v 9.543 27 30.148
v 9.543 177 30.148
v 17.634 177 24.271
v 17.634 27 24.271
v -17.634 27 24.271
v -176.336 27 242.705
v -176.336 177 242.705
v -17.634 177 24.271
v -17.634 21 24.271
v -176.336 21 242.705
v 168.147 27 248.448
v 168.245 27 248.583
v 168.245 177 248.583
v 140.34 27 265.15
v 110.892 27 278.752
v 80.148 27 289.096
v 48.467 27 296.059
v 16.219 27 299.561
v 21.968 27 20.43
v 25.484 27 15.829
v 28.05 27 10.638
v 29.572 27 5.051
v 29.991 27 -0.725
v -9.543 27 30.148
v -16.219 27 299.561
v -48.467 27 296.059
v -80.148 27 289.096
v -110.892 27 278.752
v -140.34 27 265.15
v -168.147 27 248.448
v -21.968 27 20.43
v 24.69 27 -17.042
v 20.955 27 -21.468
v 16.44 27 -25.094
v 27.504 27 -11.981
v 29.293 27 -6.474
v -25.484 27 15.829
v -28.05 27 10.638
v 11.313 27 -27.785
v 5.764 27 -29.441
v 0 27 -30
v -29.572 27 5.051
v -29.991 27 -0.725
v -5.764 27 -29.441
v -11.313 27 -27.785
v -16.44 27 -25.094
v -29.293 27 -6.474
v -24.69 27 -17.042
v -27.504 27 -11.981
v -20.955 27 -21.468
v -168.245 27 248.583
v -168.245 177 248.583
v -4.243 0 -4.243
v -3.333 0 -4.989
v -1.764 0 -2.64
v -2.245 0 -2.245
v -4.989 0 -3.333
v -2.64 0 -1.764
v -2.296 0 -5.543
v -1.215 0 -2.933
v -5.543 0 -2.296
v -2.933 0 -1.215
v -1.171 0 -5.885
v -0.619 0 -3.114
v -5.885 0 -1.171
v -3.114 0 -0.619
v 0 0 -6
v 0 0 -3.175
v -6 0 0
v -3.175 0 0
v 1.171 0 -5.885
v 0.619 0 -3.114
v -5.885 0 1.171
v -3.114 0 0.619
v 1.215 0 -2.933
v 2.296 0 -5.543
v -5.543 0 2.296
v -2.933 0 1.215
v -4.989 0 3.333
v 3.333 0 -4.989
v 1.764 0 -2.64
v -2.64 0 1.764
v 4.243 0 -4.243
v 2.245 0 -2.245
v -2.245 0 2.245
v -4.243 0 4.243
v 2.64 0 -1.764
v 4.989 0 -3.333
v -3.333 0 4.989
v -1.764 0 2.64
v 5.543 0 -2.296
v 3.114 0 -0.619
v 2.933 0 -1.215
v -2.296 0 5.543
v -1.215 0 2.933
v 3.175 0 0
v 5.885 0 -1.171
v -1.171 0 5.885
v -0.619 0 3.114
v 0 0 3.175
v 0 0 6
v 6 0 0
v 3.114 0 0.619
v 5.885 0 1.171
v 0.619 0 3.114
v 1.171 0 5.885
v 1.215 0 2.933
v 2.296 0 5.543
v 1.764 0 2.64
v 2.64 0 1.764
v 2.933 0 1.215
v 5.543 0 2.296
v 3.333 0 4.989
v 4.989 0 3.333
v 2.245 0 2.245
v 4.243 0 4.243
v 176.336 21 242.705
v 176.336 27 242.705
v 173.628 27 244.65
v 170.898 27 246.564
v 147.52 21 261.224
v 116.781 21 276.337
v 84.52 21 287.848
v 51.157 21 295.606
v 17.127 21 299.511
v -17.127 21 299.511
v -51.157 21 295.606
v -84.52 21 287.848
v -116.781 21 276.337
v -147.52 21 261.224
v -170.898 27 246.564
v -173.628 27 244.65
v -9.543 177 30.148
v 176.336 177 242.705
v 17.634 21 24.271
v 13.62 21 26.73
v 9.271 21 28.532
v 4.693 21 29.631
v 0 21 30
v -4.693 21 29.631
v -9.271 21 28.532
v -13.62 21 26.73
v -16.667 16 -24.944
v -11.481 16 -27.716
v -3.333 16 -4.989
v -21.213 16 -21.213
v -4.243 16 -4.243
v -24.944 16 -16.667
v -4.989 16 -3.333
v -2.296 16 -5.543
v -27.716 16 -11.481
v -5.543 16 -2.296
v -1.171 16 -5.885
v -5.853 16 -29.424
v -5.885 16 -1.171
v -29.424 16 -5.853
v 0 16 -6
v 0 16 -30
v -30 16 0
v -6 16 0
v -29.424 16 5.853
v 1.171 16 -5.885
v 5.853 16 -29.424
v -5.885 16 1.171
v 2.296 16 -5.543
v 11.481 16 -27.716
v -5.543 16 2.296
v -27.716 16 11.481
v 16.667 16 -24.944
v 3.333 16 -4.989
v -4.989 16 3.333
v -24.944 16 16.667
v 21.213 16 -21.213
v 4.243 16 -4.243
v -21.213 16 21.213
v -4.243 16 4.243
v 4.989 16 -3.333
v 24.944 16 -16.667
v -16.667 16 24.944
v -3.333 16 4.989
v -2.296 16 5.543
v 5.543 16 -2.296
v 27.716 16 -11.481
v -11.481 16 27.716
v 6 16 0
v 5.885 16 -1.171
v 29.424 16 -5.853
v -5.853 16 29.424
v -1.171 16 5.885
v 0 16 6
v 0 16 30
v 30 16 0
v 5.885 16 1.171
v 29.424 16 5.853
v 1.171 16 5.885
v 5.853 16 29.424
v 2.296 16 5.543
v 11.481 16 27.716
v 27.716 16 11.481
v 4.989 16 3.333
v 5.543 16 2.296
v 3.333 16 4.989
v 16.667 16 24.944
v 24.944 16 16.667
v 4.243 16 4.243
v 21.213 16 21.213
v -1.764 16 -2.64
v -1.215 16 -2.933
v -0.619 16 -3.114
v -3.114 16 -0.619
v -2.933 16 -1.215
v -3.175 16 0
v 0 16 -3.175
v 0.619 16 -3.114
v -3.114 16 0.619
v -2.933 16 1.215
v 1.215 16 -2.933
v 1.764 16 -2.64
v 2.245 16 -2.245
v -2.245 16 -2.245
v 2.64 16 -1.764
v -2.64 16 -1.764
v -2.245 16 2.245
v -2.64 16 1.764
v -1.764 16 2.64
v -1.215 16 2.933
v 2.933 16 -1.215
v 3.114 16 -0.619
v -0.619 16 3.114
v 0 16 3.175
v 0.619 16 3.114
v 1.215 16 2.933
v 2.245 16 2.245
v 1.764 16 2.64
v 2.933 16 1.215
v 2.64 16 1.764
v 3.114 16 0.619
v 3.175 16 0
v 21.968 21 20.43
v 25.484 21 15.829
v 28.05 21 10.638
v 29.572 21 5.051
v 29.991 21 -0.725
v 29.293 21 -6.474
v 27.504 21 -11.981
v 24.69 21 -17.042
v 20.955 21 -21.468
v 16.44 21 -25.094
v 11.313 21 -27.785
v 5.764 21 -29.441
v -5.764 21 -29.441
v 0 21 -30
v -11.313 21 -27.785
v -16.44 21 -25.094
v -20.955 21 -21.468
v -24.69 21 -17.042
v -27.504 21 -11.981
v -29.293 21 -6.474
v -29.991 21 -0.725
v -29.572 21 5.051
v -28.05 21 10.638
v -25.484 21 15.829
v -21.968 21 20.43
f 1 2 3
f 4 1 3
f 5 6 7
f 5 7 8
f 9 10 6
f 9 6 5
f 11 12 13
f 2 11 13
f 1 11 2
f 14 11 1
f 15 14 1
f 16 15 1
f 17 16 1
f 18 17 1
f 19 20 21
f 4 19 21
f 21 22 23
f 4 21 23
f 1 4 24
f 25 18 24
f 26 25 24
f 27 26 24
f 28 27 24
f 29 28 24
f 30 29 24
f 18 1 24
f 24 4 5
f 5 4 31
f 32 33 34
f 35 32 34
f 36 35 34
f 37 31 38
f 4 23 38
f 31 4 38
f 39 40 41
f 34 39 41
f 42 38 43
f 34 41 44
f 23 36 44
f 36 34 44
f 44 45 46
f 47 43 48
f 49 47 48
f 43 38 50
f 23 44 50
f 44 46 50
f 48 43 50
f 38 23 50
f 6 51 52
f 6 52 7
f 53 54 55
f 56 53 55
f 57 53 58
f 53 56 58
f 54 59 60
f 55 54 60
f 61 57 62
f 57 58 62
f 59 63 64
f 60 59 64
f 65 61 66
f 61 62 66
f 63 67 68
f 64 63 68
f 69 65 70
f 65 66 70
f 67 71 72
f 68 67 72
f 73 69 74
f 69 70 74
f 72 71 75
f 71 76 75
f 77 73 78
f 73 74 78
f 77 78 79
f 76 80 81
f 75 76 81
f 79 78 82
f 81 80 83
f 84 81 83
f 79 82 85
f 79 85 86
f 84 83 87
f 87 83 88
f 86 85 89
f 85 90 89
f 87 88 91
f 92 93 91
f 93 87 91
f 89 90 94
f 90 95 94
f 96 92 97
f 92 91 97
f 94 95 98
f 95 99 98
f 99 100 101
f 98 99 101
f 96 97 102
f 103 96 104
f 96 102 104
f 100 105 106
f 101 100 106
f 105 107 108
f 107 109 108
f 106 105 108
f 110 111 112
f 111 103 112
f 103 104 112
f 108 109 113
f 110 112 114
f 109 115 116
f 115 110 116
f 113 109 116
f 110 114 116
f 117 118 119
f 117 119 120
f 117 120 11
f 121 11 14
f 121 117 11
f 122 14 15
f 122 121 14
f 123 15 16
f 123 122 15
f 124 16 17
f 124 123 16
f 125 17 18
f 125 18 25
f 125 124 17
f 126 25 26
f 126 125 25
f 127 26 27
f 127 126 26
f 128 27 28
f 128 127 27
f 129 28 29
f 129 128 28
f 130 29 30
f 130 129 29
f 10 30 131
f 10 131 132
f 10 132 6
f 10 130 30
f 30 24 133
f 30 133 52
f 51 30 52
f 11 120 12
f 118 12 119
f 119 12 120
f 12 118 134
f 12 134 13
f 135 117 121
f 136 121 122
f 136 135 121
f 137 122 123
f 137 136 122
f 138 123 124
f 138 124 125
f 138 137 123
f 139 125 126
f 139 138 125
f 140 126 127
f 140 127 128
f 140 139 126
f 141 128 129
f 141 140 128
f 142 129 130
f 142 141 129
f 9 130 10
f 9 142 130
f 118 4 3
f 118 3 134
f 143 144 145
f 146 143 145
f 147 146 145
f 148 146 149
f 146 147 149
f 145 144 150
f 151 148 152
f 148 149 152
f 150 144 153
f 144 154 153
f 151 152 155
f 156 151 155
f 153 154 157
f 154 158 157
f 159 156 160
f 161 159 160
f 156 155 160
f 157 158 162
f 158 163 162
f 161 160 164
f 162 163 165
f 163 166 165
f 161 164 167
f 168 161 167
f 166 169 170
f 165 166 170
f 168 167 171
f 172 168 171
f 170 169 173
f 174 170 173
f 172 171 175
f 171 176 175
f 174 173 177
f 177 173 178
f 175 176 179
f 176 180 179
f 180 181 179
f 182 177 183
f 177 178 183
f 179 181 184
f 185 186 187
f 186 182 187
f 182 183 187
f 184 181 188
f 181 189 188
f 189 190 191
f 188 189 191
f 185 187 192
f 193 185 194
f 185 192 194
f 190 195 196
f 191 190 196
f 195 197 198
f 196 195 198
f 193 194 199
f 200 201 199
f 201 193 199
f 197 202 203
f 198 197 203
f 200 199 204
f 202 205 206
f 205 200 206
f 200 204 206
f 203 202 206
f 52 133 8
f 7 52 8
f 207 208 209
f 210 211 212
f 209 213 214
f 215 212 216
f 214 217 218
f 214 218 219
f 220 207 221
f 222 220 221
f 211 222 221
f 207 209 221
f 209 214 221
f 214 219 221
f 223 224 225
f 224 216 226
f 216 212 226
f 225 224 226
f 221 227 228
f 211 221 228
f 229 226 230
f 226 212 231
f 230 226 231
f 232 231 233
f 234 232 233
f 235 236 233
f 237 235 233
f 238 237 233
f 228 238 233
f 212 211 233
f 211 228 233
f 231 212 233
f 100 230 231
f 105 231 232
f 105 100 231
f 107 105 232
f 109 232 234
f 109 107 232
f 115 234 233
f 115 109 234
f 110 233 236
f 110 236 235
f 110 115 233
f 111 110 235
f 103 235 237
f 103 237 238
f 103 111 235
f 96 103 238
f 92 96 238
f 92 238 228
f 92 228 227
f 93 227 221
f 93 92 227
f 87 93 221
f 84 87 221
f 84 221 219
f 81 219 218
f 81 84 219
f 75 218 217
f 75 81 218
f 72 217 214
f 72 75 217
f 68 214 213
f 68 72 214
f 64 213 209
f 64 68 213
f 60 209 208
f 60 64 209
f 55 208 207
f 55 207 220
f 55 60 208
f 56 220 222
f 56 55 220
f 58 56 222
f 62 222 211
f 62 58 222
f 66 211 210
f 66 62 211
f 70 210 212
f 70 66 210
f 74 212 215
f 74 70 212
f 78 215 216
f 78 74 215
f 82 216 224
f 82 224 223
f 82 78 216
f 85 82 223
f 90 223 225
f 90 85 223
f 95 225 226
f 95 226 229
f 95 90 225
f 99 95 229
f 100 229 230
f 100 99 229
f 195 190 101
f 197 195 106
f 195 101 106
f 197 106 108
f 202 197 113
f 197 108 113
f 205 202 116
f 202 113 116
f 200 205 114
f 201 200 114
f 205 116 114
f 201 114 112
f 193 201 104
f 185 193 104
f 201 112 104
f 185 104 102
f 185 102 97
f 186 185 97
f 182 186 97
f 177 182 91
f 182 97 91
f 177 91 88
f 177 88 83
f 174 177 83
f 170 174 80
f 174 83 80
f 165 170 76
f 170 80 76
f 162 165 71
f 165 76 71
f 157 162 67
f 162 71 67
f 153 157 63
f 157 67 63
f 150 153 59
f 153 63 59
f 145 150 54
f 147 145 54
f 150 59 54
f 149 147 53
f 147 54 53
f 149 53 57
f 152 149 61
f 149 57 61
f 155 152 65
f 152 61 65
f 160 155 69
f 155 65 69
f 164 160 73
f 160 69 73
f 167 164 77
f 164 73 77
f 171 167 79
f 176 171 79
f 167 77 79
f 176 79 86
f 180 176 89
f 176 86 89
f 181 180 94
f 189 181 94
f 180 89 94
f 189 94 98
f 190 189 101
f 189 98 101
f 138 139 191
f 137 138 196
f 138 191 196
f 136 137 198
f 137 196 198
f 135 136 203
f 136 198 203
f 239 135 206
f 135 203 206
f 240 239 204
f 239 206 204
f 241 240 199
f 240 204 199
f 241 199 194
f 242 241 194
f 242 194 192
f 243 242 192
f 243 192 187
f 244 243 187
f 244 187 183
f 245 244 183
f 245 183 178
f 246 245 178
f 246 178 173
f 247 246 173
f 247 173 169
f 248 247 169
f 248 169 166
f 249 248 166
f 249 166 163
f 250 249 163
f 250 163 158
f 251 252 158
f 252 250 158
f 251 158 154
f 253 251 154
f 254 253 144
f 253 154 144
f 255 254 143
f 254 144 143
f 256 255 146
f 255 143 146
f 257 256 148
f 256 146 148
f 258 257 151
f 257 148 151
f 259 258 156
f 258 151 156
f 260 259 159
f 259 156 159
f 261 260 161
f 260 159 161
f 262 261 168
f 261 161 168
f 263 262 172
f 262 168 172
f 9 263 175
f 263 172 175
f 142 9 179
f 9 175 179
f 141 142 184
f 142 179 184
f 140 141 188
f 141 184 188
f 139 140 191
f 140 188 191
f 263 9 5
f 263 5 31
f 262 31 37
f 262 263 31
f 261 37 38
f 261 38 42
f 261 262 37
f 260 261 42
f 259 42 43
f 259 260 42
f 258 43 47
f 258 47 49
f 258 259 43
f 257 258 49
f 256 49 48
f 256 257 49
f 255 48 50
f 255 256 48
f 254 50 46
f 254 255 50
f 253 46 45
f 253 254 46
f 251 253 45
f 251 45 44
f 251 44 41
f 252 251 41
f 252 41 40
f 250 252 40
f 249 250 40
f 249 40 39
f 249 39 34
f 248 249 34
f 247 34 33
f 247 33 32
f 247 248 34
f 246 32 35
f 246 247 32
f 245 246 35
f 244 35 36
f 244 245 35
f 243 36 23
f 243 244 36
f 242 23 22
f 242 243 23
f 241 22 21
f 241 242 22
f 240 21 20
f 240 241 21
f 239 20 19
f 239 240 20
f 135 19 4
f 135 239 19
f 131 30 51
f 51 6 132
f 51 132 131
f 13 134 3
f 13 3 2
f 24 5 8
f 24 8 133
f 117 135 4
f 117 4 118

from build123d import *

# Parameters (mm, degrees)
SKETCH1_R           = 6
SKETCH1_R_2         = 3.175
BOSS_EXTRUDE1_DEPTH = 16
SKETCH2_R           = 30
BOSS_EXTRUDE2_DEPTH = 5
BOSS_EXTRUDE3_DEPTH = 6
BOSS_EXTRUDE4_DEPTH = 150


with BuildPart() as part:
    # Sketch1 → Boss-Extrude1 (new body)
    with BuildSketch(Plane(origin=(0, 0, 0), x_dir=(1, 0, 0), z_dir=(0, 1, 0))):
        with Locations(Location((0, 0, 0), (0, 0, 270))):
            Circle(SKETCH1_R)
        with Locations(Location((0, 0, 0), (0, 0, 270))):
            Circle(SKETCH1_R_2, mode=Mode.SUBTRACT)
    extrude(amount=BOSS_EXTRUDE1_DEPTH)

    # Sketch2 → Boss-Extrude2 (add)
    with BuildSketch(Plane(origin=(0, 16, 0), x_dir=(1, 0, 0), z_dir=(0, 1, 0))):
        with Locations(Location((0, 0, 0), (0, 0, 270))):
            Circle(SKETCH2_R)
    extrude(amount=BOSS_EXTRUDE2_DEPTH)

    # Sketch3 → Boss-Extrude3 (add)
    with BuildSketch(Plane(origin=(0, 21, 0), x_dir=(1, 0, 0), z_dir=(0, 1, 0))):
        with BuildLine():
            Line((17.633557569, -24.270509831), (176.335575688, -242.705098312))
            ThreePointArc((176.335575688, -242.705098312), (0, -300), (-176.335575688, -242.705098312))
            Line((-176.335575688, -242.705098312), (-17.633557569, -24.270509831))
            ThreePointArc((-17.633557569, -24.270509831), (0, 30), (17.633557569, -24.270509831))
        make_face()
    extrude(amount=BOSS_EXTRUDE3_DEPTH)

    # Sketch4 → Boss-Extrude4 (add)
    with BuildSketch(Plane(origin=(0, 27, 0), x_dir=(1, 0, 0), z_dir=(0, 1, 0))):
        Polygon((-176.335575688, -242.705098312), (-17.633557569, -24.270509831), (-9.543387625, -30.148362354), (-168.245405744, -248.582950835), align=None)
        Polygon((17.633557569, -24.270509831), (176.335575688, -242.705098312), (168.245405744, -248.582950835), (9.543387625, -30.148362354), align=None)
    extrude(amount=BOSS_EXTRUDE4_DEPTH)


solid = part.part
